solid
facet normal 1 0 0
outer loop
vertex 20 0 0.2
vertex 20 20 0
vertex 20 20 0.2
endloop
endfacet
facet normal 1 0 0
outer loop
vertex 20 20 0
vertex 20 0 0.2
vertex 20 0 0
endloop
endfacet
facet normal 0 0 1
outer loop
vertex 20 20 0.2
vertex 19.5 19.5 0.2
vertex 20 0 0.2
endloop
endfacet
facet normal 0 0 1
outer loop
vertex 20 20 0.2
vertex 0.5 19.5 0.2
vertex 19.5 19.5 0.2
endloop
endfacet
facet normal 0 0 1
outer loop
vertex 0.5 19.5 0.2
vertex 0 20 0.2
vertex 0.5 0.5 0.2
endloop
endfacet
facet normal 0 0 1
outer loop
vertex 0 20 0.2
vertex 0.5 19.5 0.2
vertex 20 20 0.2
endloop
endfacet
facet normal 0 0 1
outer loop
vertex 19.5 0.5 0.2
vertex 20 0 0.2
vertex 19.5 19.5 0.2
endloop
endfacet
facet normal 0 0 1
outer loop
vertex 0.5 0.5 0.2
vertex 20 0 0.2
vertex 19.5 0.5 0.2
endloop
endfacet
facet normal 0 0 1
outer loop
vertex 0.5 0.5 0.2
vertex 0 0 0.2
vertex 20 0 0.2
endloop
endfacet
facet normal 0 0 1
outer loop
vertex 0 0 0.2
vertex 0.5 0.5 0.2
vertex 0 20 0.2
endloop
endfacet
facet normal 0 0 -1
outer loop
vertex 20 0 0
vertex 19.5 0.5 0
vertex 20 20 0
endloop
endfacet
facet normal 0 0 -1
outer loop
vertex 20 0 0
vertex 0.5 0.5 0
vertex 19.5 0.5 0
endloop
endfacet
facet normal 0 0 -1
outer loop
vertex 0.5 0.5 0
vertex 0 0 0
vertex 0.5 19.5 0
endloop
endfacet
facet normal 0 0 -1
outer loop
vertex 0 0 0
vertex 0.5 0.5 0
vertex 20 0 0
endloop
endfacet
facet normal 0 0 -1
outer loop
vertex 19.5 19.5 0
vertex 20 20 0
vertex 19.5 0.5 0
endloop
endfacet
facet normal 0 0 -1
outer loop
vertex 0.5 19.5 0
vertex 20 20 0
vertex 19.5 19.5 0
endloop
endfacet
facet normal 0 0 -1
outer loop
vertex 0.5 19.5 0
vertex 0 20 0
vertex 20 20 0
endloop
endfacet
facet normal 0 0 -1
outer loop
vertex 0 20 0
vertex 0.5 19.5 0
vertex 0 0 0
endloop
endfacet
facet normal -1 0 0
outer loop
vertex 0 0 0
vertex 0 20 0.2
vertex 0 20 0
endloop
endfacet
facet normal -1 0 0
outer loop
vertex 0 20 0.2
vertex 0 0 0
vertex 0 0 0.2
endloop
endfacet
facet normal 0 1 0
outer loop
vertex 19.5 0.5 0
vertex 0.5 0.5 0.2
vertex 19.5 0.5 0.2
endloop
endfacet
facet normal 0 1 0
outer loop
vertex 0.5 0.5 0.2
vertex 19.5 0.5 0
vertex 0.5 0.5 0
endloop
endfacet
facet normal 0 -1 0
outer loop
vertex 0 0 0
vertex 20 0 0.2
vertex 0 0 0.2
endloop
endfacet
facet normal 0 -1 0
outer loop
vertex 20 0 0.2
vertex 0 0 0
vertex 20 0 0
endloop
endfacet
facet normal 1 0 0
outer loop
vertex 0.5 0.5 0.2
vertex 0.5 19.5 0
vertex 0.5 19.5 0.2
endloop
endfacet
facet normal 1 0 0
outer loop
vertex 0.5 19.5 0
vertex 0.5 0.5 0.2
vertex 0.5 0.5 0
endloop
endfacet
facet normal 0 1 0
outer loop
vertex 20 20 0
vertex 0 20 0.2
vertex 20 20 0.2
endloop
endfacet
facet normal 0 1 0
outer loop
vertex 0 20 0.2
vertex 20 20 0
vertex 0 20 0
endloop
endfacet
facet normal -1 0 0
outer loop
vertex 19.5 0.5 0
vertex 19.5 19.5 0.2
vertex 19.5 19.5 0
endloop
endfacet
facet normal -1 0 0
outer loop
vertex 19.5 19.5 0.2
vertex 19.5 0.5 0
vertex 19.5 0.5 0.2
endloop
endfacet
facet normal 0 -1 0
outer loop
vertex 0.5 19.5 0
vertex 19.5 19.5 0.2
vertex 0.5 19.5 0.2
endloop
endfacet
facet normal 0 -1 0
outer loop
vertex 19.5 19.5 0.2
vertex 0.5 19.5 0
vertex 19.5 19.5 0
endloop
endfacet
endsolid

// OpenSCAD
height = .2;
size = 20;

module legs() {
cube([size, .5, height]);
cube([.5, size, height]);
}

module unfilled() {
    legs();
    translate([size, 0, 0]) mirror([1, 0, 0]) legs();
    translate([0, size, 0]) mirror([0, 1, 0]) legs();
}

module filled() {
    cube([size, size, height]);
}

unfilled();
